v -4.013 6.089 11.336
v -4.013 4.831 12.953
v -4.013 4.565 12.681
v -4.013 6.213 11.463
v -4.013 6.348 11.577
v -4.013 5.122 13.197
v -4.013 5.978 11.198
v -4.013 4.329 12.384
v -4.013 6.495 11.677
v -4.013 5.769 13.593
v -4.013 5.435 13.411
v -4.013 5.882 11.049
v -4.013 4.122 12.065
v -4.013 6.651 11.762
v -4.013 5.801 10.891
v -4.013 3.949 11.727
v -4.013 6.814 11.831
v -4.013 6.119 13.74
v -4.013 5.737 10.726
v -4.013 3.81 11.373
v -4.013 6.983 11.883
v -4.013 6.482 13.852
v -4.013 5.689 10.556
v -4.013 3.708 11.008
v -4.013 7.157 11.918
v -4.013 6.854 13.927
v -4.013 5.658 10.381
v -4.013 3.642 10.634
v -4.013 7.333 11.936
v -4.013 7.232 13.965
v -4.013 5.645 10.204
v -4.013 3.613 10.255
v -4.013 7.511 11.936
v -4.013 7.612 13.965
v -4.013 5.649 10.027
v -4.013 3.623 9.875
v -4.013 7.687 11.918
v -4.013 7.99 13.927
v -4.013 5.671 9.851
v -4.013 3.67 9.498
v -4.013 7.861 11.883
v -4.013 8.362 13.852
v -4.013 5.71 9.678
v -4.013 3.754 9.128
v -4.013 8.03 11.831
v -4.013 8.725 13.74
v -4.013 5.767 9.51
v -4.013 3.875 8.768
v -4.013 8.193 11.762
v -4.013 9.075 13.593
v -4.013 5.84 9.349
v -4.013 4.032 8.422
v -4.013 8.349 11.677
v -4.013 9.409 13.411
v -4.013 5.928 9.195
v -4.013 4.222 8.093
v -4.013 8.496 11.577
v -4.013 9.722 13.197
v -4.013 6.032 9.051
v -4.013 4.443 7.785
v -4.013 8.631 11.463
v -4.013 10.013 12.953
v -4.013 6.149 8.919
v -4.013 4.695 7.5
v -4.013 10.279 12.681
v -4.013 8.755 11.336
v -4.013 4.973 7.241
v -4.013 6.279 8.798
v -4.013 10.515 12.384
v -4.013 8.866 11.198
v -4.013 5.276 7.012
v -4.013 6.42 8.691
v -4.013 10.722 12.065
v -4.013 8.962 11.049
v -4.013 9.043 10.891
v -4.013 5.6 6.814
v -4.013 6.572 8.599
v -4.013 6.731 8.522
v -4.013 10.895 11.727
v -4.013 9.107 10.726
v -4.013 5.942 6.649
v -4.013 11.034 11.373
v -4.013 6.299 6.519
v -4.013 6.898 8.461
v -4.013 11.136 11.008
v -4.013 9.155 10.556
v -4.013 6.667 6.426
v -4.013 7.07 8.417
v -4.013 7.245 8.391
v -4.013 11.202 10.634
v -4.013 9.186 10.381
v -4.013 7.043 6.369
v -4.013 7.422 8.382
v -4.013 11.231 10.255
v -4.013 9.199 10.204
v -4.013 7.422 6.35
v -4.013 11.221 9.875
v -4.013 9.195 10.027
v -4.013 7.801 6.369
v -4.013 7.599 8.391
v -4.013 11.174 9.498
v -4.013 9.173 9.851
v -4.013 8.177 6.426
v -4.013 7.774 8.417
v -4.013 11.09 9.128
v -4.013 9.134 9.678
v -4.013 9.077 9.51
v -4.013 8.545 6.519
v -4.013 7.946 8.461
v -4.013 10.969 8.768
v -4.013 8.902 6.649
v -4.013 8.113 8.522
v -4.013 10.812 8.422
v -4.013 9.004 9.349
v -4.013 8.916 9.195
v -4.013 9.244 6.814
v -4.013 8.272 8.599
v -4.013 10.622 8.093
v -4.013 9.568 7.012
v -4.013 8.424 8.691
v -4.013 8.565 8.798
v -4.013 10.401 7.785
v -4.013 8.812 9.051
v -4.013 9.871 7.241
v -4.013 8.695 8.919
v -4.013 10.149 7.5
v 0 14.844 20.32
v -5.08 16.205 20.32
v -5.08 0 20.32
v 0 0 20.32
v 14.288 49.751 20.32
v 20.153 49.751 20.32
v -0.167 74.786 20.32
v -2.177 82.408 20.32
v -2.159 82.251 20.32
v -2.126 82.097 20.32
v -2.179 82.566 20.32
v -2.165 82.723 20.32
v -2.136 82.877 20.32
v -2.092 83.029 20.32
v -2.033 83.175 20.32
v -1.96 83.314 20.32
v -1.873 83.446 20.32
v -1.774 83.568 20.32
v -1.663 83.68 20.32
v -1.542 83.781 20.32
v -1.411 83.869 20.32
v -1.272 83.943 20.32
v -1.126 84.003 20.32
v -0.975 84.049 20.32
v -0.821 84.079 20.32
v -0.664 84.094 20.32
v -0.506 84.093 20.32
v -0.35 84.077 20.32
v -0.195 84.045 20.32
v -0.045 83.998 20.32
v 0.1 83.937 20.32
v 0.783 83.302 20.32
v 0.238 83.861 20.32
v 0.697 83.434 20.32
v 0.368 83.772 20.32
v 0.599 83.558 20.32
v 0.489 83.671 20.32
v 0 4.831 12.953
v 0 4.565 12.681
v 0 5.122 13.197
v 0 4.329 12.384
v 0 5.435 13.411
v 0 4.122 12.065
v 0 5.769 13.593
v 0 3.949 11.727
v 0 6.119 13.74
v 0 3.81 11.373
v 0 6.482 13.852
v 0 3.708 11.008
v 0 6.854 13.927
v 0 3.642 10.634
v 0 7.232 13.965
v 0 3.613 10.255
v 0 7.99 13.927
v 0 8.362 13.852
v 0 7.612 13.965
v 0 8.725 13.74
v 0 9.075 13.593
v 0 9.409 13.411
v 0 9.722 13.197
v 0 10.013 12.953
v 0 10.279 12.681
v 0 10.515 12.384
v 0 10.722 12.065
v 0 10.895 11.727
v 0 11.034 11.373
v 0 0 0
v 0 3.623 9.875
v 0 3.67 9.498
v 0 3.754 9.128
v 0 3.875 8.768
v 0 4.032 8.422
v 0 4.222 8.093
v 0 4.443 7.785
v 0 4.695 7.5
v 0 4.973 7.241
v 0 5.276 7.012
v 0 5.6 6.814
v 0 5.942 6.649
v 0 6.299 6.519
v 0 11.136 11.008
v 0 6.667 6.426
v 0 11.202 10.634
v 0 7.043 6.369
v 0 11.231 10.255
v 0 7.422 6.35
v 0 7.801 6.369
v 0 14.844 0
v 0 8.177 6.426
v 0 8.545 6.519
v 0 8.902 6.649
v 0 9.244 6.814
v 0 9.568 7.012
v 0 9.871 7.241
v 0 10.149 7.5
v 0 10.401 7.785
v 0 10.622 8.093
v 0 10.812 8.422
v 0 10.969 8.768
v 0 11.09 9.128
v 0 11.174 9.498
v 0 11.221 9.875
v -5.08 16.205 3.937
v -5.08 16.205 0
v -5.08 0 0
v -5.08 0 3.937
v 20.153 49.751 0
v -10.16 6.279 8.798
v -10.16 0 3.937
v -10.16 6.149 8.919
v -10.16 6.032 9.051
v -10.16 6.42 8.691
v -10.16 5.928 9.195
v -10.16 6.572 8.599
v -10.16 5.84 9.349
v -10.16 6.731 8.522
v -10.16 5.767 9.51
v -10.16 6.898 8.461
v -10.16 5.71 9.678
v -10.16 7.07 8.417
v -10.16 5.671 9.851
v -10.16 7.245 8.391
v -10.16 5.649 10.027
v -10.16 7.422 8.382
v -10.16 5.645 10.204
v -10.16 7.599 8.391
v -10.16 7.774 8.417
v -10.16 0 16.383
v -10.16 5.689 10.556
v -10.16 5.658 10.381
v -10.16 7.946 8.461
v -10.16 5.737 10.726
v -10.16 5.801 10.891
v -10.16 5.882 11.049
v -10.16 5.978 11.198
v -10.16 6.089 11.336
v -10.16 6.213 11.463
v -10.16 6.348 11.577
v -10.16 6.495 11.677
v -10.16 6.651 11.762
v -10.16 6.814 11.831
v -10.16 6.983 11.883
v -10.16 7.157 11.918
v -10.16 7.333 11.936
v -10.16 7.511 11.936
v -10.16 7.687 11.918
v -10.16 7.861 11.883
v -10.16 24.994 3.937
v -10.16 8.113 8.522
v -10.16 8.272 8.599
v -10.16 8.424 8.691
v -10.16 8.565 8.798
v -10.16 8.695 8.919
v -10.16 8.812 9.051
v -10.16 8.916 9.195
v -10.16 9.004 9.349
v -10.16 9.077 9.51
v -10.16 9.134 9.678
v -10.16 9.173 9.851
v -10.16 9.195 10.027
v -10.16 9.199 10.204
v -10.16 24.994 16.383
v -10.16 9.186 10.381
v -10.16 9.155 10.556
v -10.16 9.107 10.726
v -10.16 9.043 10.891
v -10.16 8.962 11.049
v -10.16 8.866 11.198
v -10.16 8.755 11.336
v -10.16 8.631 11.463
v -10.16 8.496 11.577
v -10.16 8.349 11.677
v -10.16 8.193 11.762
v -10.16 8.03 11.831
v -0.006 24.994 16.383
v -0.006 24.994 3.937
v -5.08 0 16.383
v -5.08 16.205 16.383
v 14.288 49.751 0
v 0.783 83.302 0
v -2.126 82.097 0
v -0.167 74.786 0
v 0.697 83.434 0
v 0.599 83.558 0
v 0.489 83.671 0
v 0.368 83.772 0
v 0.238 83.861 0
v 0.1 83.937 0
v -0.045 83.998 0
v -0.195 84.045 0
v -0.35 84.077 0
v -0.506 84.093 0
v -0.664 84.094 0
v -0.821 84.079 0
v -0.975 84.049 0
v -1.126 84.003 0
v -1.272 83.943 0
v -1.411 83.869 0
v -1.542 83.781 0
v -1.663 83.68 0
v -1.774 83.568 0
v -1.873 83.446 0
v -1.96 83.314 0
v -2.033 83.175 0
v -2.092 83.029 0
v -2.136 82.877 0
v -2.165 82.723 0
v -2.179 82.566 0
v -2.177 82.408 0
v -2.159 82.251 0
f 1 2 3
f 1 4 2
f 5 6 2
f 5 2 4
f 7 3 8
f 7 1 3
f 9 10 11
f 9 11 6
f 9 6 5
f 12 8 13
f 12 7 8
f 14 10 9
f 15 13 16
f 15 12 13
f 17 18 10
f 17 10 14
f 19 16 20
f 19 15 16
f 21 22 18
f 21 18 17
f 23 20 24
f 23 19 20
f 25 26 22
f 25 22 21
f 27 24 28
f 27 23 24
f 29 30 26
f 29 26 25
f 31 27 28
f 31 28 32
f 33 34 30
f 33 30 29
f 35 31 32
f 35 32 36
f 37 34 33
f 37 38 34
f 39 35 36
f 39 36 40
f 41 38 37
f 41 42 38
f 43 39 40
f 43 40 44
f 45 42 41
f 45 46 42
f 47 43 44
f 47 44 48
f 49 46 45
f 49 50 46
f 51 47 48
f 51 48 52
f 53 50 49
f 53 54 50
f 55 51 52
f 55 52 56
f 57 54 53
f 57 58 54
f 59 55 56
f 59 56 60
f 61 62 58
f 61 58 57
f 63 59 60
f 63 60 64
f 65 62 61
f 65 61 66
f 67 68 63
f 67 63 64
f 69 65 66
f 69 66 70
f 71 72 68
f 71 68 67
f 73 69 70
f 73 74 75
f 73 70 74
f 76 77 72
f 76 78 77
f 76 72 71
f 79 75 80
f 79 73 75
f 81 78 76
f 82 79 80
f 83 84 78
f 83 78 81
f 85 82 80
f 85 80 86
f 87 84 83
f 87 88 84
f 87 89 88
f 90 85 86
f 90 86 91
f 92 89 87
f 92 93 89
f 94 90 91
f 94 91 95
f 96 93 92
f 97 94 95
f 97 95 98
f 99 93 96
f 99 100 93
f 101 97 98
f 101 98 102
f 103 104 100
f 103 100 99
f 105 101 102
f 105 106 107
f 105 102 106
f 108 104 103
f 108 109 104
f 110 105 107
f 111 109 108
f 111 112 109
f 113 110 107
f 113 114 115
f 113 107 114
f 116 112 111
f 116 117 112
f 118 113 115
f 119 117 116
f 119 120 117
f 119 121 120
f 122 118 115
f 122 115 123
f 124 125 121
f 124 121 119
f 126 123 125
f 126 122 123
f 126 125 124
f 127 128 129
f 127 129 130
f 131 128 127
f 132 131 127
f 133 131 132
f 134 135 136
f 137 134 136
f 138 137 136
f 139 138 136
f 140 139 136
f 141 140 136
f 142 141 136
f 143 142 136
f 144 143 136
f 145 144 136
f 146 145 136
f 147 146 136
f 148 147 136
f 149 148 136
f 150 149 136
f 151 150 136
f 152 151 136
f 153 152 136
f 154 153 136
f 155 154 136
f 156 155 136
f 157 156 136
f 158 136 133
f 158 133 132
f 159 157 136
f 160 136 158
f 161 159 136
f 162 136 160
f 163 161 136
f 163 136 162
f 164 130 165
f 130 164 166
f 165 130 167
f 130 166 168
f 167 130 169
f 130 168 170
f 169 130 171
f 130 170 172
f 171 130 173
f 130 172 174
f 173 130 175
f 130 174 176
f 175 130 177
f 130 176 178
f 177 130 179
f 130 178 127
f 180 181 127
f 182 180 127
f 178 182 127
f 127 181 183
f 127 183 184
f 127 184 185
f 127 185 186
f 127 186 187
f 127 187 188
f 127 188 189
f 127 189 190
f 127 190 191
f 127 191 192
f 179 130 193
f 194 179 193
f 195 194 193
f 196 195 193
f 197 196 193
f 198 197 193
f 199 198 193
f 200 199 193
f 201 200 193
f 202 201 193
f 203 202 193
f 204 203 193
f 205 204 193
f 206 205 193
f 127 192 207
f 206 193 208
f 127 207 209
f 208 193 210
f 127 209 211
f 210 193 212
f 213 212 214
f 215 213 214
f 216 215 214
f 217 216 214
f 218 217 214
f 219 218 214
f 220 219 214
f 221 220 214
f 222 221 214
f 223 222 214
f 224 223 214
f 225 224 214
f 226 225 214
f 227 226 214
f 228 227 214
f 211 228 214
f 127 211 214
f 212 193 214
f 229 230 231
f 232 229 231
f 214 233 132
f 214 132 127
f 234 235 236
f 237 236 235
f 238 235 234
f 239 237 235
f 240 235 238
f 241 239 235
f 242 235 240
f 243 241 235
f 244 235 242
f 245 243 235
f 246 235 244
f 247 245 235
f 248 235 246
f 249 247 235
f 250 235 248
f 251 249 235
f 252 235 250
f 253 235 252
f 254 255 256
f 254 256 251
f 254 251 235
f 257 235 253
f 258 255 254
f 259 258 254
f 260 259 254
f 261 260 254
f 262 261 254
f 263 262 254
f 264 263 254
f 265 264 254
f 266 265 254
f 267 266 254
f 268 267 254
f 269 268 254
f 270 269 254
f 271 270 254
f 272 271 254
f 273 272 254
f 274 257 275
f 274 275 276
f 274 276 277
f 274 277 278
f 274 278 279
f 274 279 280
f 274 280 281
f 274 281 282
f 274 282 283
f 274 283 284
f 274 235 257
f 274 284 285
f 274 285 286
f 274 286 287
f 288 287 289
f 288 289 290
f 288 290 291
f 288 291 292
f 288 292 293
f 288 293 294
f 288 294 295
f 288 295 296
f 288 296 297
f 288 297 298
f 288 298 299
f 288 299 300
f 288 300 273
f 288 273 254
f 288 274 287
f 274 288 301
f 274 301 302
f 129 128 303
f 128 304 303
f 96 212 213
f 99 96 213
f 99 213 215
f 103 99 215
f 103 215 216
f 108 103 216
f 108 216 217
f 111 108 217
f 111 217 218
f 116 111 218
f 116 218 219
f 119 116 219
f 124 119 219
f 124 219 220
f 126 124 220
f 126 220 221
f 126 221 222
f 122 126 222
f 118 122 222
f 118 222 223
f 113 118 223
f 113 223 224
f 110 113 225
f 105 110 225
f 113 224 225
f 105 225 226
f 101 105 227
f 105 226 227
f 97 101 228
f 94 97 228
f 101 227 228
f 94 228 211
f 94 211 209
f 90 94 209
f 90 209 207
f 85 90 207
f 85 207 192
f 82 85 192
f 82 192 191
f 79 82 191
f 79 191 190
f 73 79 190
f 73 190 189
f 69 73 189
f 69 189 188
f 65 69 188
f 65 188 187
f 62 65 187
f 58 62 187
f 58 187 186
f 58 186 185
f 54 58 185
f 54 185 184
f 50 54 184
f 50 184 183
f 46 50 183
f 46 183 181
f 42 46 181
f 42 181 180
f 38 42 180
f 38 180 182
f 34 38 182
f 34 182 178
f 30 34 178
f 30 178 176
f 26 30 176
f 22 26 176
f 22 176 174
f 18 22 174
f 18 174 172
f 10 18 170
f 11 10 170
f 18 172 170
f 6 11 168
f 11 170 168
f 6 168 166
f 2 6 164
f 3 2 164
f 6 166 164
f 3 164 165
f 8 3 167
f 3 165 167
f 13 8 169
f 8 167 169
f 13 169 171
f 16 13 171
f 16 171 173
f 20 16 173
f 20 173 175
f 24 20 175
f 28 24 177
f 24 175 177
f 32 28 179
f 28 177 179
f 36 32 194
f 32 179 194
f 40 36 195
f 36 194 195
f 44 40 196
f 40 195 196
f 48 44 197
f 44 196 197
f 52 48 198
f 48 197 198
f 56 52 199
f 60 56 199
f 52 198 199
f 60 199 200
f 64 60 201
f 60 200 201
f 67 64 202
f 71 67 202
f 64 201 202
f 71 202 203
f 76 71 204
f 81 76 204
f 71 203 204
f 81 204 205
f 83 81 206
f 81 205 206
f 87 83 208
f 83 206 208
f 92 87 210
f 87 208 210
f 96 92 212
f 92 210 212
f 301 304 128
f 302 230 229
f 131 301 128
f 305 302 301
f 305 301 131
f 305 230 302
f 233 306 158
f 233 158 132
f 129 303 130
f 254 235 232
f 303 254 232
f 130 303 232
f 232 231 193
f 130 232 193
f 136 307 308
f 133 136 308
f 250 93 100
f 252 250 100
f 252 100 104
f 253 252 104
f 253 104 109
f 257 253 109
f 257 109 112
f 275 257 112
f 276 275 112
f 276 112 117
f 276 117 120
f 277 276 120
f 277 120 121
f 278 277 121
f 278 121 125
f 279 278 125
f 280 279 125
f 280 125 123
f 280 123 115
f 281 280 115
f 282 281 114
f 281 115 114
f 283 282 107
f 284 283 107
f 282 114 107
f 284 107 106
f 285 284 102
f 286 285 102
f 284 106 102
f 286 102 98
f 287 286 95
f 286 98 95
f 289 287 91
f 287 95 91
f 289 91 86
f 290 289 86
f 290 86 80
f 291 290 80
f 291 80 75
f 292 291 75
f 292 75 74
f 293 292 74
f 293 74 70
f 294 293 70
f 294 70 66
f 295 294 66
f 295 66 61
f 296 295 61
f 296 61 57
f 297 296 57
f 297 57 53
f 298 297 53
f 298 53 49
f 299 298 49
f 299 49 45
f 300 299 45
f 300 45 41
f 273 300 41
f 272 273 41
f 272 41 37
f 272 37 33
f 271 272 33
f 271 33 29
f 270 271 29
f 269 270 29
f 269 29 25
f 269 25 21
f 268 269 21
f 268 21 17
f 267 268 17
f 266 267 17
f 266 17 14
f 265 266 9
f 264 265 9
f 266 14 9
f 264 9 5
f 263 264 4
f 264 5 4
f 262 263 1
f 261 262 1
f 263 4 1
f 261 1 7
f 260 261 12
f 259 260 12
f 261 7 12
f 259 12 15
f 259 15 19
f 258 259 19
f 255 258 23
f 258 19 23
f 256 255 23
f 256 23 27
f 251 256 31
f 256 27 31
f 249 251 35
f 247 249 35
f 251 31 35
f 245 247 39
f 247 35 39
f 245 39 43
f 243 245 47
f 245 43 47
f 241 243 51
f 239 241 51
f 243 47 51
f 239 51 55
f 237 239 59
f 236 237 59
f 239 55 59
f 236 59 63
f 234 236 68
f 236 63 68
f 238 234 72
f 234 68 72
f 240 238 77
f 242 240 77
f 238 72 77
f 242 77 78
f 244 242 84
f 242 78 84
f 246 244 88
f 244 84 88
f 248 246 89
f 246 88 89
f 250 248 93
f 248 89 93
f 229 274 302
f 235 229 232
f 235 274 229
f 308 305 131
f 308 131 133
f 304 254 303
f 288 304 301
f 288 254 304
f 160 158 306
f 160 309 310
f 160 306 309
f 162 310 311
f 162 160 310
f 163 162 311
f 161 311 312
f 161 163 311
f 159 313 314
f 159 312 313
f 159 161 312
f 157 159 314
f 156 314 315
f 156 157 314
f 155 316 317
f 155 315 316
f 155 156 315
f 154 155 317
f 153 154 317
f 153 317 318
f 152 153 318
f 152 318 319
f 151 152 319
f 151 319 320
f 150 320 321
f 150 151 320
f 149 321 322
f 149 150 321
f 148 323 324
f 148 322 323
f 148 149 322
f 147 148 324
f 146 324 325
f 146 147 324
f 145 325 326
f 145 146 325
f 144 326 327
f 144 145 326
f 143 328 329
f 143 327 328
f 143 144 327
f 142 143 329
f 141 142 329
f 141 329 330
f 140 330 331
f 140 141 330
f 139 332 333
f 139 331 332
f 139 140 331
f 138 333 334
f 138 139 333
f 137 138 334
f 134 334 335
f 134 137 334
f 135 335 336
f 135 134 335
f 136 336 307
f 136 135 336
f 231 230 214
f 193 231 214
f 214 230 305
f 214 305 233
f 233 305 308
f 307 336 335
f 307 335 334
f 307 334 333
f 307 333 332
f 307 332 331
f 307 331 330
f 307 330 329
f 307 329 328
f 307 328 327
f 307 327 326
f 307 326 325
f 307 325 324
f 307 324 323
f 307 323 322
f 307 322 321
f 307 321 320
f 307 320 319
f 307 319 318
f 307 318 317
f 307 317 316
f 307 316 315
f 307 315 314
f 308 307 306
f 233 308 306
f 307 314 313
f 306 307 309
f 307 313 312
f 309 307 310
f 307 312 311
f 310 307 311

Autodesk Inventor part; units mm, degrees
ref_plane "YZ Plane" through (0, 0, 0) normal (1, 0, 0) x (0, 1, 0)
ref_plane "XZ Plane" through (0, 0, 0) normal (0, 1, 0) x (-1, 0, 0)
ref_plane "XY Plane" through (0, 0, 0) normal (0, 0, 1) x (1, 0, 0)
sketch "Sketch1" plane through (0, 0, 0) normal (0, 0, 1) x (1, 0, 0)
  line L0 (0, 0) -> (0, 14.844)
  line L1 (-5.08, 16.2052) -> (-5.08, 0)
  line L2 (-5.08, 0) -> (0, 0)
  line L3 (-5.08, 16.2052) -> (14.2875, 49.7507)
  line L4 (14.2875, 49.7507) -> (-9.646, 91.2048)
  line L5 (-9.646, 91.2048) -> (-5.2466, 93.7448)
  line L6 (-5.2466, 93.7448) -> (20.1534, 49.7507)
  line L7 (20.1534, 49.7507) -> (0, 14.844)
  line L8 (-5.2466, 93.7448) -> (-0.1666, 74.786)
  dimension "d0" = 16.2052
  dimension "d1" = 5.08
  dimension "d6" = 5.08
  dimension "d7" = 5.08
  dimension "d8" = 30
  dimension "d10" = 120
  dimension "d11" = 50.8
  dimension "d12" = 38.735
  dimension "d13" = 15
extrude "Extrusion1" add sketch "Sketch1" along normal blind 20.32 contours L2 L1 L3 L4 L8 L6 L7 L0
fillet "Fillet1" radius 1.5875 1 edges at (-5.2466, 93.7448, 10.16)
ref_plane "Work Plane1" through (-10.16, 0, 0) normal (-1, 0, 0) x (0, 0, 1)
sketch "Sketch2" plane through (-10.16, 0, 0) normal (-1, 0, 0) x (0, 0, 1)
  line L0 (0, 0) -> (20.32, 0) projected
  line L1 (3.937, 0) -> (16.383, 0)
  line L2 (16.383, 0) -> (16.383, 24.9936)
  line L3 (16.383, 24.9936) -> (3.937, 24.9936)
  line L4 (3.937, 24.9936) -> (3.937, 0)
  point P0 (10.16, 0)
  point P1 (16.383, 0)
  dimension "d16" = 12.446
  dimension "d17" = 24.9936
  dimension "d18" = 6.223
extrude "Extrusion2" add sketch "Sketch2" against normal up to next
sketch "Sketch3" plane through (0, 0, 0) normal (1, 0, 0) x (0, 0, -1)
  circle A0 centre (-10.16, 7.422) radius 1.778
  line L0 (0, 0) -> (0, 14.844) projected
  line L1 (0, 0) -> (-20.32, 0) projected
  point P0 (0, 7.422)
  point P1 (-10.16, 0)
  dimension "d23" = 3.556
extrude "Extrusion3" cut sketch "Sketch3" against normal blind 15.875
sketch "Sketch4" plane through (0, 0, 0) normal (1, 0, 0) x (0, 0, -1)
  circle A0 centre (-10.16, 7.422) radius 1.778 projected
  circle A1 centre (-10.16, 7.422) radius 3.81
  point P0 (0, 0)
  dimension "d24" = 7.62
extrude "Extrusion4" cut sketch "Sketch4" against normal blind 4.0132 contours A0 | A1
equation "\"d18\" = 0.5 * d16"
properties part number "KNUCKLE 1"
